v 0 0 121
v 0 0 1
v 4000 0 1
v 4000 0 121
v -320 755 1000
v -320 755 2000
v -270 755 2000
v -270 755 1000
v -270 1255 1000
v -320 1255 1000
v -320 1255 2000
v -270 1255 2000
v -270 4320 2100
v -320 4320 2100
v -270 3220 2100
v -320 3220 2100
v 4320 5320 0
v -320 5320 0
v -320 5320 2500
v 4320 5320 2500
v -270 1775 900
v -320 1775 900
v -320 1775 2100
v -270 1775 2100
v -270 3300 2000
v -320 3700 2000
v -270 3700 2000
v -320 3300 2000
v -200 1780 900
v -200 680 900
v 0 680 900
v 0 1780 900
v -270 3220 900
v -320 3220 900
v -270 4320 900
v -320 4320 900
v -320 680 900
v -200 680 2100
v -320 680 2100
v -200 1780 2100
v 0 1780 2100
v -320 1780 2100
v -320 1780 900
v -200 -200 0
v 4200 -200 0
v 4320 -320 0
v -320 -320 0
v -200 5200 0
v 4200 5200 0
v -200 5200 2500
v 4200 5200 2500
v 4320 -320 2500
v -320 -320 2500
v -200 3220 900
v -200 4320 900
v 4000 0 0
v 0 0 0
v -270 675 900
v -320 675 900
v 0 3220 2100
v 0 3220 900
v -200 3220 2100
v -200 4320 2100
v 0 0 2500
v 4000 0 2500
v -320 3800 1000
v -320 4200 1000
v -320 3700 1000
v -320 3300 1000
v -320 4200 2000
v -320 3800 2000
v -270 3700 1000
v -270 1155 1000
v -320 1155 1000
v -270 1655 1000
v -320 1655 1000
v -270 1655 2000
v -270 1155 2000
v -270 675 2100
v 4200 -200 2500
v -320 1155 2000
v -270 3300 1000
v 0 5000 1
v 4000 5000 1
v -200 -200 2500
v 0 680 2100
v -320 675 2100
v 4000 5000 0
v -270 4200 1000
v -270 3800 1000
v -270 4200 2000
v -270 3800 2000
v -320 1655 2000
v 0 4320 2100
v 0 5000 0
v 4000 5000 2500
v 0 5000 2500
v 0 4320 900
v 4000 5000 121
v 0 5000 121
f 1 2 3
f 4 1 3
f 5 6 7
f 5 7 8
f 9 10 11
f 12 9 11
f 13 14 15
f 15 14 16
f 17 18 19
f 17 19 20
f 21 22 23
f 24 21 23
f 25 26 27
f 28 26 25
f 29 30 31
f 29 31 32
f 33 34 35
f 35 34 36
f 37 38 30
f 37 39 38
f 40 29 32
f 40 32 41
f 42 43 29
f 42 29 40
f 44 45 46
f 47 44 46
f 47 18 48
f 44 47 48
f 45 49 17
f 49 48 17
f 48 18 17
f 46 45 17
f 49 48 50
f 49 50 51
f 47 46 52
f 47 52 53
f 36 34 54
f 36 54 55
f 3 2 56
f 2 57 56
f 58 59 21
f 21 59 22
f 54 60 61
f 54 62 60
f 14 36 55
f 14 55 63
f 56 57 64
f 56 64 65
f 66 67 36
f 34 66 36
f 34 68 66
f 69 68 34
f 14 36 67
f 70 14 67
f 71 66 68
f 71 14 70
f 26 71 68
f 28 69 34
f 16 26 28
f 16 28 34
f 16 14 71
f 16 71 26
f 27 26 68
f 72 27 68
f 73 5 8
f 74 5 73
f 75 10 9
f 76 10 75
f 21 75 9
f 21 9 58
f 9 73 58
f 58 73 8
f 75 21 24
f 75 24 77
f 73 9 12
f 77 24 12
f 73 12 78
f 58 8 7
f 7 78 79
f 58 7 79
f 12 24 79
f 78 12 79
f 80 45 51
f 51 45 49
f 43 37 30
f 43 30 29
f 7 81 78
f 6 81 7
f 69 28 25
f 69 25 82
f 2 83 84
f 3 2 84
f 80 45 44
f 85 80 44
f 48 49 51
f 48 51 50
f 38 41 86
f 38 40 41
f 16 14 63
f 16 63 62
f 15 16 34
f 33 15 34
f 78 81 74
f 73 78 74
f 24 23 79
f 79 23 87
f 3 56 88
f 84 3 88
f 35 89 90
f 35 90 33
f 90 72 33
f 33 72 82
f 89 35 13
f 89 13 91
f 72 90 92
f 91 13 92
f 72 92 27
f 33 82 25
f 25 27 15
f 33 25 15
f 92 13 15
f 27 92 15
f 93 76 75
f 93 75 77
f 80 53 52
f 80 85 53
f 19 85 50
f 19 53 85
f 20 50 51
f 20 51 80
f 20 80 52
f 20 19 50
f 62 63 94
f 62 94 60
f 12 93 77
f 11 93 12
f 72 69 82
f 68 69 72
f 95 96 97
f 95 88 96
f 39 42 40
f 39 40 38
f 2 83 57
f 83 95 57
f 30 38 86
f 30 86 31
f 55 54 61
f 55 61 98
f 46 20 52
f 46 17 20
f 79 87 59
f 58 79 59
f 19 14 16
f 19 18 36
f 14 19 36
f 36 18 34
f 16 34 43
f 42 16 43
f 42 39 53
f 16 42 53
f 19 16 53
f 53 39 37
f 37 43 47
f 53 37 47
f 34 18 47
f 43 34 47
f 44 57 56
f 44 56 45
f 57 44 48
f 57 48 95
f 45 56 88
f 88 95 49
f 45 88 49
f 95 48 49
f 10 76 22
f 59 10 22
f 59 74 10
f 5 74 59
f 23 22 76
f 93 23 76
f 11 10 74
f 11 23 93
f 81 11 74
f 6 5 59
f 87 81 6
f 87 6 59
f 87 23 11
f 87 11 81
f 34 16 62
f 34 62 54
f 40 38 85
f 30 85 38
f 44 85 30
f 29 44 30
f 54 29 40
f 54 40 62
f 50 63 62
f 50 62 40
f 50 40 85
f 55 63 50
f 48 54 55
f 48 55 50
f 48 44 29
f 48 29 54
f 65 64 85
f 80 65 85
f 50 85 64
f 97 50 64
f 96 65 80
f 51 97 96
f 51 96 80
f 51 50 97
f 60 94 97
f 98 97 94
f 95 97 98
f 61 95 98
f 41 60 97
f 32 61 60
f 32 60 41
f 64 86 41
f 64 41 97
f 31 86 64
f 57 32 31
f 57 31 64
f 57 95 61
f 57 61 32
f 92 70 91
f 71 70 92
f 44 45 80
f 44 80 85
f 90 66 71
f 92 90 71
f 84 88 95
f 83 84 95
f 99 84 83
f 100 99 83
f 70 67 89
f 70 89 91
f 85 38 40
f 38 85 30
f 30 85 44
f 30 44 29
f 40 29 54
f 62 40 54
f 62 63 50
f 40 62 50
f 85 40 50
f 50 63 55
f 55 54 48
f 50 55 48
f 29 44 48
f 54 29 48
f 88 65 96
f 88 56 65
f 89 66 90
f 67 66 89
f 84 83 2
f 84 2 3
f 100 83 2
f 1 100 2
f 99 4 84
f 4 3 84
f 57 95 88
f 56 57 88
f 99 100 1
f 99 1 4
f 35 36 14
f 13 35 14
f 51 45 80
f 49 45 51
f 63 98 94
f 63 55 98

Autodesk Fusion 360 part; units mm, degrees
sketch "Esquisse1" plane through (0, 0, 0) normal (0, 0, 1) x (1, 0, 0)
  line L0 (0, 0) -> (4000, 0)
  line L1 (4000, 0) -> (4000, 5000)
  line L2 (4000, 5000) -> (0, 5000)
  line L3 (0, 5000) -> (0, 0)
  line L4 (0, 5000) -> (4000, 5000)
  line L5 (4000, 5000) -> (4000, 5200)
  line L6 (4000, 5200) -> (0, 5200)
  line L7 (0, 5200) -> (0, 5000)
  line L8 (0, 0) -> (4000, 0)
  line L9 (4000, 0) -> (4000, -200)
  line L10 (4000, -200) -> (0, -200)
  line L11 (0, -200) -> (0, 0)
  line L12 (4000, -200) -> (4200, -200)
  line L13 (4200, -200) -> (4200, 5200)
  line L14 (4200, 5200) -> (4000, 5200)
  line L15 (4000, 5200) -> (4000, -200)
  line L16 (0, -200) -> (-200, -200)
  line L17 (-200, -200) -> (-200, 5200)
  line L18 (-200, 5200) -> (0, 5200)
  line L19 (0, 5200) -> (0, -200)
  line L20 (-200, 5200) -> (4200, 5200)
  line L21 (4200, 5200) -> (4200, 5320)
  line L22 (4200, 5320) -> (-200, 5320)
  line L23 (-200, 5320) -> (-200, 5200)
  line L24 (-200, -200) -> (4200, -200)
  line L25 (4200, -200) -> (4200, -320)
  line L26 (4200, -320) -> (-200, -320)
  line L27 (-200, -320) -> (-200, -200)
  line L28 (-200, 5320) -> (-320, 5320)
  line L29 (-320, 5320) -> (-320, -320)
  line L30 (-320, -320) -> (-200, -320)
  line L31 (-200, -320) -> (-200, 5320)
  line L32 (4200, 5320) -> (4320, 5320)
  line L33 (4320, 5320) -> (4320, -320)
  line L34 (4320, -320) -> (4200, -320)
  line L35 (4200, -320) -> (4200, 5320)
  dimension "d1" = 4000
  dimension "d4" = 5000
  dimension "d5" = 200
  dimension "d6" = 120
  dimension "d7" = 120
  dimension "d8" = 120
  dimension "d9" = 120
  dimension "d11" = 200
extrude "Extrusion1" add sketch "Esquisse1" along normal blind 1 contours L0 L1 L2 L3 L4 L8 L15 L19 makes body 1
extrude "Extrusion3" add sketch "Esquisse1" along normal blind 2500 separate body contours L10 L12 L16 L24 L25 L26 L27 L31 L35 | L6 L14 L18 L20 L21 L22 L23 L31 L35 | L17 L23 L27 L28 L29 L30 L31 | L13 L21 L25 L32 L33 L34 L35 makes body 2
extrude "Extrusion4" add 1 faces at (1333.3333, 3333.3333, 1) along direction (0, 0, 1) blind 120 separate body on bodies 1 makes body 3
extrude "Extrusion2" add sketch "Esquisse1" along normal blind 2500 separate body contours L3 L7 L11 L16 L17 L18 L19 L20 L24 L31 | L0 L8 L9 L10 L11 L15 L19 L24 | L1 L5 L9 L12 L13 L14 L15 L20 L24 L35 | L2 L4 L5 L6 L7 L15 L19 L20 makes body 4
sketch "Esquisse2" plane through (-320, 0, 0) normal (-1, 0, 0) x (0, -1, 0)
  line L0 (-5320, 0) -> (320, 0)
  line L1 (320, 0) -> (320, 2500)
  line L2 (320, 2500) -> (-5320, 2500)
  line L3 (-5320, 2500) -> (-5320, 0)
  line L4 (-1780, 2100) -> (-680, 2100)
  line L5 (-680, 2100) -> (-680, 900)
  line L6 (-680, 900) -> (-1780, 900)
  line L7 (-1780, 900) -> (-1780, 2100)
  line L8 (-5320, 0) -> (320, 0)
  line L9 (-4320, 2100) -> (-3220, 2100)
  line L10 (-3220, 2100) -> (-3220, 900)
  line L11 (-3220, 900) -> (-4320, 900)
  line L12 (-4320, 900) -> (-4320, 2100)
  dimension "d18" = 900
  dimension "d19" = 1100
  dimension "d20" = 1200
  dimension "d21" = 1100
  dimension "d22" = 1200
  dimension "d23" = 900
  dimension "d24" = 1000
  dimension "d25" = 1000
extrude "Extrusion5" cut sketch "Esquisse2" against normal up to surface (320 mm away) contours L4 L5 L6 L7 | L9 L10 L11 L12 bodies 2 4
sketch "Esquisse1 (2)" plane through (-320, 0, 0) normal (-1, 0, 0) x (0, -1, 0) in component "Fenetre"
  line L0 (-4320, 900) -> (-4320, 2100)
  line L1 (-4320, 2100) -> (-3220, 2100)
  line L2 (-3220, 2100) -> (-3220, 900)
  line L3 (-3220, 900) -> (-4320, 900)
  line L4 (-1780, 900) -> (-1780, 2100)
  line L5 (-1780, 2100) -> (-680, 2100)
  line L6 (-680, 2100) -> (-680, 900)
  line L7 (-680, 900) -> (-1780, 900)
  line L8 (-5320, 0) -> (320, 0)
  line L9 (320, 0) -> (320, 2500)
  line L10 (320, 2500) -> (-5320, 2500)
  line L11 (-5320, 2500) -> (-5320, 0)
  line L12 (-4320, 2100) -> (-3220, 2100)
  line L13 (-3220, 2100) -> (-3220, 900)
  line L14 (-3220, 900) -> (-4320, 900)
  line L15 (-4320, 900) -> (-4320, 2100)
  line L16 (-4200, 2000) -> (-3300, 2000)
  line L17 (-3300, 2000) -> (-3300, 1000)
  line L18 (-3300, 1000) -> (-4200, 1000)
  line L19 (-4200, 1000) -> (-4200, 2000)
  line L20 (-3800, 2000) -> (-3700, 2000)
  line L21 (-3700, 2000) -> (-3700, 1000)
  line L22 (-3700, 1000) -> (-3800, 1000)
  line L23 (-3800, 1000) -> (-3800, 2000)
extrude "Extrusion1'" add sketch "Esquisse1 (2)" against normal blind 50 separate body contours L0 L1 L2 L3 L12 L13 L14 L15 | L16 L18 L20 L21 L22 L23 makes body 5 in component "Fenetre"
component "Fenetre" placed x (1, 0, 0) y (0, 1, 0) z (0, 0, 1) at (0, 0, 0)
component "Fenetre" placed x (1, 0, 0) y (0, 1, 0) z (0, 0, 1) at (0, -2545, 0)
equation "d23 = d18"
equation "d25 = d24"
